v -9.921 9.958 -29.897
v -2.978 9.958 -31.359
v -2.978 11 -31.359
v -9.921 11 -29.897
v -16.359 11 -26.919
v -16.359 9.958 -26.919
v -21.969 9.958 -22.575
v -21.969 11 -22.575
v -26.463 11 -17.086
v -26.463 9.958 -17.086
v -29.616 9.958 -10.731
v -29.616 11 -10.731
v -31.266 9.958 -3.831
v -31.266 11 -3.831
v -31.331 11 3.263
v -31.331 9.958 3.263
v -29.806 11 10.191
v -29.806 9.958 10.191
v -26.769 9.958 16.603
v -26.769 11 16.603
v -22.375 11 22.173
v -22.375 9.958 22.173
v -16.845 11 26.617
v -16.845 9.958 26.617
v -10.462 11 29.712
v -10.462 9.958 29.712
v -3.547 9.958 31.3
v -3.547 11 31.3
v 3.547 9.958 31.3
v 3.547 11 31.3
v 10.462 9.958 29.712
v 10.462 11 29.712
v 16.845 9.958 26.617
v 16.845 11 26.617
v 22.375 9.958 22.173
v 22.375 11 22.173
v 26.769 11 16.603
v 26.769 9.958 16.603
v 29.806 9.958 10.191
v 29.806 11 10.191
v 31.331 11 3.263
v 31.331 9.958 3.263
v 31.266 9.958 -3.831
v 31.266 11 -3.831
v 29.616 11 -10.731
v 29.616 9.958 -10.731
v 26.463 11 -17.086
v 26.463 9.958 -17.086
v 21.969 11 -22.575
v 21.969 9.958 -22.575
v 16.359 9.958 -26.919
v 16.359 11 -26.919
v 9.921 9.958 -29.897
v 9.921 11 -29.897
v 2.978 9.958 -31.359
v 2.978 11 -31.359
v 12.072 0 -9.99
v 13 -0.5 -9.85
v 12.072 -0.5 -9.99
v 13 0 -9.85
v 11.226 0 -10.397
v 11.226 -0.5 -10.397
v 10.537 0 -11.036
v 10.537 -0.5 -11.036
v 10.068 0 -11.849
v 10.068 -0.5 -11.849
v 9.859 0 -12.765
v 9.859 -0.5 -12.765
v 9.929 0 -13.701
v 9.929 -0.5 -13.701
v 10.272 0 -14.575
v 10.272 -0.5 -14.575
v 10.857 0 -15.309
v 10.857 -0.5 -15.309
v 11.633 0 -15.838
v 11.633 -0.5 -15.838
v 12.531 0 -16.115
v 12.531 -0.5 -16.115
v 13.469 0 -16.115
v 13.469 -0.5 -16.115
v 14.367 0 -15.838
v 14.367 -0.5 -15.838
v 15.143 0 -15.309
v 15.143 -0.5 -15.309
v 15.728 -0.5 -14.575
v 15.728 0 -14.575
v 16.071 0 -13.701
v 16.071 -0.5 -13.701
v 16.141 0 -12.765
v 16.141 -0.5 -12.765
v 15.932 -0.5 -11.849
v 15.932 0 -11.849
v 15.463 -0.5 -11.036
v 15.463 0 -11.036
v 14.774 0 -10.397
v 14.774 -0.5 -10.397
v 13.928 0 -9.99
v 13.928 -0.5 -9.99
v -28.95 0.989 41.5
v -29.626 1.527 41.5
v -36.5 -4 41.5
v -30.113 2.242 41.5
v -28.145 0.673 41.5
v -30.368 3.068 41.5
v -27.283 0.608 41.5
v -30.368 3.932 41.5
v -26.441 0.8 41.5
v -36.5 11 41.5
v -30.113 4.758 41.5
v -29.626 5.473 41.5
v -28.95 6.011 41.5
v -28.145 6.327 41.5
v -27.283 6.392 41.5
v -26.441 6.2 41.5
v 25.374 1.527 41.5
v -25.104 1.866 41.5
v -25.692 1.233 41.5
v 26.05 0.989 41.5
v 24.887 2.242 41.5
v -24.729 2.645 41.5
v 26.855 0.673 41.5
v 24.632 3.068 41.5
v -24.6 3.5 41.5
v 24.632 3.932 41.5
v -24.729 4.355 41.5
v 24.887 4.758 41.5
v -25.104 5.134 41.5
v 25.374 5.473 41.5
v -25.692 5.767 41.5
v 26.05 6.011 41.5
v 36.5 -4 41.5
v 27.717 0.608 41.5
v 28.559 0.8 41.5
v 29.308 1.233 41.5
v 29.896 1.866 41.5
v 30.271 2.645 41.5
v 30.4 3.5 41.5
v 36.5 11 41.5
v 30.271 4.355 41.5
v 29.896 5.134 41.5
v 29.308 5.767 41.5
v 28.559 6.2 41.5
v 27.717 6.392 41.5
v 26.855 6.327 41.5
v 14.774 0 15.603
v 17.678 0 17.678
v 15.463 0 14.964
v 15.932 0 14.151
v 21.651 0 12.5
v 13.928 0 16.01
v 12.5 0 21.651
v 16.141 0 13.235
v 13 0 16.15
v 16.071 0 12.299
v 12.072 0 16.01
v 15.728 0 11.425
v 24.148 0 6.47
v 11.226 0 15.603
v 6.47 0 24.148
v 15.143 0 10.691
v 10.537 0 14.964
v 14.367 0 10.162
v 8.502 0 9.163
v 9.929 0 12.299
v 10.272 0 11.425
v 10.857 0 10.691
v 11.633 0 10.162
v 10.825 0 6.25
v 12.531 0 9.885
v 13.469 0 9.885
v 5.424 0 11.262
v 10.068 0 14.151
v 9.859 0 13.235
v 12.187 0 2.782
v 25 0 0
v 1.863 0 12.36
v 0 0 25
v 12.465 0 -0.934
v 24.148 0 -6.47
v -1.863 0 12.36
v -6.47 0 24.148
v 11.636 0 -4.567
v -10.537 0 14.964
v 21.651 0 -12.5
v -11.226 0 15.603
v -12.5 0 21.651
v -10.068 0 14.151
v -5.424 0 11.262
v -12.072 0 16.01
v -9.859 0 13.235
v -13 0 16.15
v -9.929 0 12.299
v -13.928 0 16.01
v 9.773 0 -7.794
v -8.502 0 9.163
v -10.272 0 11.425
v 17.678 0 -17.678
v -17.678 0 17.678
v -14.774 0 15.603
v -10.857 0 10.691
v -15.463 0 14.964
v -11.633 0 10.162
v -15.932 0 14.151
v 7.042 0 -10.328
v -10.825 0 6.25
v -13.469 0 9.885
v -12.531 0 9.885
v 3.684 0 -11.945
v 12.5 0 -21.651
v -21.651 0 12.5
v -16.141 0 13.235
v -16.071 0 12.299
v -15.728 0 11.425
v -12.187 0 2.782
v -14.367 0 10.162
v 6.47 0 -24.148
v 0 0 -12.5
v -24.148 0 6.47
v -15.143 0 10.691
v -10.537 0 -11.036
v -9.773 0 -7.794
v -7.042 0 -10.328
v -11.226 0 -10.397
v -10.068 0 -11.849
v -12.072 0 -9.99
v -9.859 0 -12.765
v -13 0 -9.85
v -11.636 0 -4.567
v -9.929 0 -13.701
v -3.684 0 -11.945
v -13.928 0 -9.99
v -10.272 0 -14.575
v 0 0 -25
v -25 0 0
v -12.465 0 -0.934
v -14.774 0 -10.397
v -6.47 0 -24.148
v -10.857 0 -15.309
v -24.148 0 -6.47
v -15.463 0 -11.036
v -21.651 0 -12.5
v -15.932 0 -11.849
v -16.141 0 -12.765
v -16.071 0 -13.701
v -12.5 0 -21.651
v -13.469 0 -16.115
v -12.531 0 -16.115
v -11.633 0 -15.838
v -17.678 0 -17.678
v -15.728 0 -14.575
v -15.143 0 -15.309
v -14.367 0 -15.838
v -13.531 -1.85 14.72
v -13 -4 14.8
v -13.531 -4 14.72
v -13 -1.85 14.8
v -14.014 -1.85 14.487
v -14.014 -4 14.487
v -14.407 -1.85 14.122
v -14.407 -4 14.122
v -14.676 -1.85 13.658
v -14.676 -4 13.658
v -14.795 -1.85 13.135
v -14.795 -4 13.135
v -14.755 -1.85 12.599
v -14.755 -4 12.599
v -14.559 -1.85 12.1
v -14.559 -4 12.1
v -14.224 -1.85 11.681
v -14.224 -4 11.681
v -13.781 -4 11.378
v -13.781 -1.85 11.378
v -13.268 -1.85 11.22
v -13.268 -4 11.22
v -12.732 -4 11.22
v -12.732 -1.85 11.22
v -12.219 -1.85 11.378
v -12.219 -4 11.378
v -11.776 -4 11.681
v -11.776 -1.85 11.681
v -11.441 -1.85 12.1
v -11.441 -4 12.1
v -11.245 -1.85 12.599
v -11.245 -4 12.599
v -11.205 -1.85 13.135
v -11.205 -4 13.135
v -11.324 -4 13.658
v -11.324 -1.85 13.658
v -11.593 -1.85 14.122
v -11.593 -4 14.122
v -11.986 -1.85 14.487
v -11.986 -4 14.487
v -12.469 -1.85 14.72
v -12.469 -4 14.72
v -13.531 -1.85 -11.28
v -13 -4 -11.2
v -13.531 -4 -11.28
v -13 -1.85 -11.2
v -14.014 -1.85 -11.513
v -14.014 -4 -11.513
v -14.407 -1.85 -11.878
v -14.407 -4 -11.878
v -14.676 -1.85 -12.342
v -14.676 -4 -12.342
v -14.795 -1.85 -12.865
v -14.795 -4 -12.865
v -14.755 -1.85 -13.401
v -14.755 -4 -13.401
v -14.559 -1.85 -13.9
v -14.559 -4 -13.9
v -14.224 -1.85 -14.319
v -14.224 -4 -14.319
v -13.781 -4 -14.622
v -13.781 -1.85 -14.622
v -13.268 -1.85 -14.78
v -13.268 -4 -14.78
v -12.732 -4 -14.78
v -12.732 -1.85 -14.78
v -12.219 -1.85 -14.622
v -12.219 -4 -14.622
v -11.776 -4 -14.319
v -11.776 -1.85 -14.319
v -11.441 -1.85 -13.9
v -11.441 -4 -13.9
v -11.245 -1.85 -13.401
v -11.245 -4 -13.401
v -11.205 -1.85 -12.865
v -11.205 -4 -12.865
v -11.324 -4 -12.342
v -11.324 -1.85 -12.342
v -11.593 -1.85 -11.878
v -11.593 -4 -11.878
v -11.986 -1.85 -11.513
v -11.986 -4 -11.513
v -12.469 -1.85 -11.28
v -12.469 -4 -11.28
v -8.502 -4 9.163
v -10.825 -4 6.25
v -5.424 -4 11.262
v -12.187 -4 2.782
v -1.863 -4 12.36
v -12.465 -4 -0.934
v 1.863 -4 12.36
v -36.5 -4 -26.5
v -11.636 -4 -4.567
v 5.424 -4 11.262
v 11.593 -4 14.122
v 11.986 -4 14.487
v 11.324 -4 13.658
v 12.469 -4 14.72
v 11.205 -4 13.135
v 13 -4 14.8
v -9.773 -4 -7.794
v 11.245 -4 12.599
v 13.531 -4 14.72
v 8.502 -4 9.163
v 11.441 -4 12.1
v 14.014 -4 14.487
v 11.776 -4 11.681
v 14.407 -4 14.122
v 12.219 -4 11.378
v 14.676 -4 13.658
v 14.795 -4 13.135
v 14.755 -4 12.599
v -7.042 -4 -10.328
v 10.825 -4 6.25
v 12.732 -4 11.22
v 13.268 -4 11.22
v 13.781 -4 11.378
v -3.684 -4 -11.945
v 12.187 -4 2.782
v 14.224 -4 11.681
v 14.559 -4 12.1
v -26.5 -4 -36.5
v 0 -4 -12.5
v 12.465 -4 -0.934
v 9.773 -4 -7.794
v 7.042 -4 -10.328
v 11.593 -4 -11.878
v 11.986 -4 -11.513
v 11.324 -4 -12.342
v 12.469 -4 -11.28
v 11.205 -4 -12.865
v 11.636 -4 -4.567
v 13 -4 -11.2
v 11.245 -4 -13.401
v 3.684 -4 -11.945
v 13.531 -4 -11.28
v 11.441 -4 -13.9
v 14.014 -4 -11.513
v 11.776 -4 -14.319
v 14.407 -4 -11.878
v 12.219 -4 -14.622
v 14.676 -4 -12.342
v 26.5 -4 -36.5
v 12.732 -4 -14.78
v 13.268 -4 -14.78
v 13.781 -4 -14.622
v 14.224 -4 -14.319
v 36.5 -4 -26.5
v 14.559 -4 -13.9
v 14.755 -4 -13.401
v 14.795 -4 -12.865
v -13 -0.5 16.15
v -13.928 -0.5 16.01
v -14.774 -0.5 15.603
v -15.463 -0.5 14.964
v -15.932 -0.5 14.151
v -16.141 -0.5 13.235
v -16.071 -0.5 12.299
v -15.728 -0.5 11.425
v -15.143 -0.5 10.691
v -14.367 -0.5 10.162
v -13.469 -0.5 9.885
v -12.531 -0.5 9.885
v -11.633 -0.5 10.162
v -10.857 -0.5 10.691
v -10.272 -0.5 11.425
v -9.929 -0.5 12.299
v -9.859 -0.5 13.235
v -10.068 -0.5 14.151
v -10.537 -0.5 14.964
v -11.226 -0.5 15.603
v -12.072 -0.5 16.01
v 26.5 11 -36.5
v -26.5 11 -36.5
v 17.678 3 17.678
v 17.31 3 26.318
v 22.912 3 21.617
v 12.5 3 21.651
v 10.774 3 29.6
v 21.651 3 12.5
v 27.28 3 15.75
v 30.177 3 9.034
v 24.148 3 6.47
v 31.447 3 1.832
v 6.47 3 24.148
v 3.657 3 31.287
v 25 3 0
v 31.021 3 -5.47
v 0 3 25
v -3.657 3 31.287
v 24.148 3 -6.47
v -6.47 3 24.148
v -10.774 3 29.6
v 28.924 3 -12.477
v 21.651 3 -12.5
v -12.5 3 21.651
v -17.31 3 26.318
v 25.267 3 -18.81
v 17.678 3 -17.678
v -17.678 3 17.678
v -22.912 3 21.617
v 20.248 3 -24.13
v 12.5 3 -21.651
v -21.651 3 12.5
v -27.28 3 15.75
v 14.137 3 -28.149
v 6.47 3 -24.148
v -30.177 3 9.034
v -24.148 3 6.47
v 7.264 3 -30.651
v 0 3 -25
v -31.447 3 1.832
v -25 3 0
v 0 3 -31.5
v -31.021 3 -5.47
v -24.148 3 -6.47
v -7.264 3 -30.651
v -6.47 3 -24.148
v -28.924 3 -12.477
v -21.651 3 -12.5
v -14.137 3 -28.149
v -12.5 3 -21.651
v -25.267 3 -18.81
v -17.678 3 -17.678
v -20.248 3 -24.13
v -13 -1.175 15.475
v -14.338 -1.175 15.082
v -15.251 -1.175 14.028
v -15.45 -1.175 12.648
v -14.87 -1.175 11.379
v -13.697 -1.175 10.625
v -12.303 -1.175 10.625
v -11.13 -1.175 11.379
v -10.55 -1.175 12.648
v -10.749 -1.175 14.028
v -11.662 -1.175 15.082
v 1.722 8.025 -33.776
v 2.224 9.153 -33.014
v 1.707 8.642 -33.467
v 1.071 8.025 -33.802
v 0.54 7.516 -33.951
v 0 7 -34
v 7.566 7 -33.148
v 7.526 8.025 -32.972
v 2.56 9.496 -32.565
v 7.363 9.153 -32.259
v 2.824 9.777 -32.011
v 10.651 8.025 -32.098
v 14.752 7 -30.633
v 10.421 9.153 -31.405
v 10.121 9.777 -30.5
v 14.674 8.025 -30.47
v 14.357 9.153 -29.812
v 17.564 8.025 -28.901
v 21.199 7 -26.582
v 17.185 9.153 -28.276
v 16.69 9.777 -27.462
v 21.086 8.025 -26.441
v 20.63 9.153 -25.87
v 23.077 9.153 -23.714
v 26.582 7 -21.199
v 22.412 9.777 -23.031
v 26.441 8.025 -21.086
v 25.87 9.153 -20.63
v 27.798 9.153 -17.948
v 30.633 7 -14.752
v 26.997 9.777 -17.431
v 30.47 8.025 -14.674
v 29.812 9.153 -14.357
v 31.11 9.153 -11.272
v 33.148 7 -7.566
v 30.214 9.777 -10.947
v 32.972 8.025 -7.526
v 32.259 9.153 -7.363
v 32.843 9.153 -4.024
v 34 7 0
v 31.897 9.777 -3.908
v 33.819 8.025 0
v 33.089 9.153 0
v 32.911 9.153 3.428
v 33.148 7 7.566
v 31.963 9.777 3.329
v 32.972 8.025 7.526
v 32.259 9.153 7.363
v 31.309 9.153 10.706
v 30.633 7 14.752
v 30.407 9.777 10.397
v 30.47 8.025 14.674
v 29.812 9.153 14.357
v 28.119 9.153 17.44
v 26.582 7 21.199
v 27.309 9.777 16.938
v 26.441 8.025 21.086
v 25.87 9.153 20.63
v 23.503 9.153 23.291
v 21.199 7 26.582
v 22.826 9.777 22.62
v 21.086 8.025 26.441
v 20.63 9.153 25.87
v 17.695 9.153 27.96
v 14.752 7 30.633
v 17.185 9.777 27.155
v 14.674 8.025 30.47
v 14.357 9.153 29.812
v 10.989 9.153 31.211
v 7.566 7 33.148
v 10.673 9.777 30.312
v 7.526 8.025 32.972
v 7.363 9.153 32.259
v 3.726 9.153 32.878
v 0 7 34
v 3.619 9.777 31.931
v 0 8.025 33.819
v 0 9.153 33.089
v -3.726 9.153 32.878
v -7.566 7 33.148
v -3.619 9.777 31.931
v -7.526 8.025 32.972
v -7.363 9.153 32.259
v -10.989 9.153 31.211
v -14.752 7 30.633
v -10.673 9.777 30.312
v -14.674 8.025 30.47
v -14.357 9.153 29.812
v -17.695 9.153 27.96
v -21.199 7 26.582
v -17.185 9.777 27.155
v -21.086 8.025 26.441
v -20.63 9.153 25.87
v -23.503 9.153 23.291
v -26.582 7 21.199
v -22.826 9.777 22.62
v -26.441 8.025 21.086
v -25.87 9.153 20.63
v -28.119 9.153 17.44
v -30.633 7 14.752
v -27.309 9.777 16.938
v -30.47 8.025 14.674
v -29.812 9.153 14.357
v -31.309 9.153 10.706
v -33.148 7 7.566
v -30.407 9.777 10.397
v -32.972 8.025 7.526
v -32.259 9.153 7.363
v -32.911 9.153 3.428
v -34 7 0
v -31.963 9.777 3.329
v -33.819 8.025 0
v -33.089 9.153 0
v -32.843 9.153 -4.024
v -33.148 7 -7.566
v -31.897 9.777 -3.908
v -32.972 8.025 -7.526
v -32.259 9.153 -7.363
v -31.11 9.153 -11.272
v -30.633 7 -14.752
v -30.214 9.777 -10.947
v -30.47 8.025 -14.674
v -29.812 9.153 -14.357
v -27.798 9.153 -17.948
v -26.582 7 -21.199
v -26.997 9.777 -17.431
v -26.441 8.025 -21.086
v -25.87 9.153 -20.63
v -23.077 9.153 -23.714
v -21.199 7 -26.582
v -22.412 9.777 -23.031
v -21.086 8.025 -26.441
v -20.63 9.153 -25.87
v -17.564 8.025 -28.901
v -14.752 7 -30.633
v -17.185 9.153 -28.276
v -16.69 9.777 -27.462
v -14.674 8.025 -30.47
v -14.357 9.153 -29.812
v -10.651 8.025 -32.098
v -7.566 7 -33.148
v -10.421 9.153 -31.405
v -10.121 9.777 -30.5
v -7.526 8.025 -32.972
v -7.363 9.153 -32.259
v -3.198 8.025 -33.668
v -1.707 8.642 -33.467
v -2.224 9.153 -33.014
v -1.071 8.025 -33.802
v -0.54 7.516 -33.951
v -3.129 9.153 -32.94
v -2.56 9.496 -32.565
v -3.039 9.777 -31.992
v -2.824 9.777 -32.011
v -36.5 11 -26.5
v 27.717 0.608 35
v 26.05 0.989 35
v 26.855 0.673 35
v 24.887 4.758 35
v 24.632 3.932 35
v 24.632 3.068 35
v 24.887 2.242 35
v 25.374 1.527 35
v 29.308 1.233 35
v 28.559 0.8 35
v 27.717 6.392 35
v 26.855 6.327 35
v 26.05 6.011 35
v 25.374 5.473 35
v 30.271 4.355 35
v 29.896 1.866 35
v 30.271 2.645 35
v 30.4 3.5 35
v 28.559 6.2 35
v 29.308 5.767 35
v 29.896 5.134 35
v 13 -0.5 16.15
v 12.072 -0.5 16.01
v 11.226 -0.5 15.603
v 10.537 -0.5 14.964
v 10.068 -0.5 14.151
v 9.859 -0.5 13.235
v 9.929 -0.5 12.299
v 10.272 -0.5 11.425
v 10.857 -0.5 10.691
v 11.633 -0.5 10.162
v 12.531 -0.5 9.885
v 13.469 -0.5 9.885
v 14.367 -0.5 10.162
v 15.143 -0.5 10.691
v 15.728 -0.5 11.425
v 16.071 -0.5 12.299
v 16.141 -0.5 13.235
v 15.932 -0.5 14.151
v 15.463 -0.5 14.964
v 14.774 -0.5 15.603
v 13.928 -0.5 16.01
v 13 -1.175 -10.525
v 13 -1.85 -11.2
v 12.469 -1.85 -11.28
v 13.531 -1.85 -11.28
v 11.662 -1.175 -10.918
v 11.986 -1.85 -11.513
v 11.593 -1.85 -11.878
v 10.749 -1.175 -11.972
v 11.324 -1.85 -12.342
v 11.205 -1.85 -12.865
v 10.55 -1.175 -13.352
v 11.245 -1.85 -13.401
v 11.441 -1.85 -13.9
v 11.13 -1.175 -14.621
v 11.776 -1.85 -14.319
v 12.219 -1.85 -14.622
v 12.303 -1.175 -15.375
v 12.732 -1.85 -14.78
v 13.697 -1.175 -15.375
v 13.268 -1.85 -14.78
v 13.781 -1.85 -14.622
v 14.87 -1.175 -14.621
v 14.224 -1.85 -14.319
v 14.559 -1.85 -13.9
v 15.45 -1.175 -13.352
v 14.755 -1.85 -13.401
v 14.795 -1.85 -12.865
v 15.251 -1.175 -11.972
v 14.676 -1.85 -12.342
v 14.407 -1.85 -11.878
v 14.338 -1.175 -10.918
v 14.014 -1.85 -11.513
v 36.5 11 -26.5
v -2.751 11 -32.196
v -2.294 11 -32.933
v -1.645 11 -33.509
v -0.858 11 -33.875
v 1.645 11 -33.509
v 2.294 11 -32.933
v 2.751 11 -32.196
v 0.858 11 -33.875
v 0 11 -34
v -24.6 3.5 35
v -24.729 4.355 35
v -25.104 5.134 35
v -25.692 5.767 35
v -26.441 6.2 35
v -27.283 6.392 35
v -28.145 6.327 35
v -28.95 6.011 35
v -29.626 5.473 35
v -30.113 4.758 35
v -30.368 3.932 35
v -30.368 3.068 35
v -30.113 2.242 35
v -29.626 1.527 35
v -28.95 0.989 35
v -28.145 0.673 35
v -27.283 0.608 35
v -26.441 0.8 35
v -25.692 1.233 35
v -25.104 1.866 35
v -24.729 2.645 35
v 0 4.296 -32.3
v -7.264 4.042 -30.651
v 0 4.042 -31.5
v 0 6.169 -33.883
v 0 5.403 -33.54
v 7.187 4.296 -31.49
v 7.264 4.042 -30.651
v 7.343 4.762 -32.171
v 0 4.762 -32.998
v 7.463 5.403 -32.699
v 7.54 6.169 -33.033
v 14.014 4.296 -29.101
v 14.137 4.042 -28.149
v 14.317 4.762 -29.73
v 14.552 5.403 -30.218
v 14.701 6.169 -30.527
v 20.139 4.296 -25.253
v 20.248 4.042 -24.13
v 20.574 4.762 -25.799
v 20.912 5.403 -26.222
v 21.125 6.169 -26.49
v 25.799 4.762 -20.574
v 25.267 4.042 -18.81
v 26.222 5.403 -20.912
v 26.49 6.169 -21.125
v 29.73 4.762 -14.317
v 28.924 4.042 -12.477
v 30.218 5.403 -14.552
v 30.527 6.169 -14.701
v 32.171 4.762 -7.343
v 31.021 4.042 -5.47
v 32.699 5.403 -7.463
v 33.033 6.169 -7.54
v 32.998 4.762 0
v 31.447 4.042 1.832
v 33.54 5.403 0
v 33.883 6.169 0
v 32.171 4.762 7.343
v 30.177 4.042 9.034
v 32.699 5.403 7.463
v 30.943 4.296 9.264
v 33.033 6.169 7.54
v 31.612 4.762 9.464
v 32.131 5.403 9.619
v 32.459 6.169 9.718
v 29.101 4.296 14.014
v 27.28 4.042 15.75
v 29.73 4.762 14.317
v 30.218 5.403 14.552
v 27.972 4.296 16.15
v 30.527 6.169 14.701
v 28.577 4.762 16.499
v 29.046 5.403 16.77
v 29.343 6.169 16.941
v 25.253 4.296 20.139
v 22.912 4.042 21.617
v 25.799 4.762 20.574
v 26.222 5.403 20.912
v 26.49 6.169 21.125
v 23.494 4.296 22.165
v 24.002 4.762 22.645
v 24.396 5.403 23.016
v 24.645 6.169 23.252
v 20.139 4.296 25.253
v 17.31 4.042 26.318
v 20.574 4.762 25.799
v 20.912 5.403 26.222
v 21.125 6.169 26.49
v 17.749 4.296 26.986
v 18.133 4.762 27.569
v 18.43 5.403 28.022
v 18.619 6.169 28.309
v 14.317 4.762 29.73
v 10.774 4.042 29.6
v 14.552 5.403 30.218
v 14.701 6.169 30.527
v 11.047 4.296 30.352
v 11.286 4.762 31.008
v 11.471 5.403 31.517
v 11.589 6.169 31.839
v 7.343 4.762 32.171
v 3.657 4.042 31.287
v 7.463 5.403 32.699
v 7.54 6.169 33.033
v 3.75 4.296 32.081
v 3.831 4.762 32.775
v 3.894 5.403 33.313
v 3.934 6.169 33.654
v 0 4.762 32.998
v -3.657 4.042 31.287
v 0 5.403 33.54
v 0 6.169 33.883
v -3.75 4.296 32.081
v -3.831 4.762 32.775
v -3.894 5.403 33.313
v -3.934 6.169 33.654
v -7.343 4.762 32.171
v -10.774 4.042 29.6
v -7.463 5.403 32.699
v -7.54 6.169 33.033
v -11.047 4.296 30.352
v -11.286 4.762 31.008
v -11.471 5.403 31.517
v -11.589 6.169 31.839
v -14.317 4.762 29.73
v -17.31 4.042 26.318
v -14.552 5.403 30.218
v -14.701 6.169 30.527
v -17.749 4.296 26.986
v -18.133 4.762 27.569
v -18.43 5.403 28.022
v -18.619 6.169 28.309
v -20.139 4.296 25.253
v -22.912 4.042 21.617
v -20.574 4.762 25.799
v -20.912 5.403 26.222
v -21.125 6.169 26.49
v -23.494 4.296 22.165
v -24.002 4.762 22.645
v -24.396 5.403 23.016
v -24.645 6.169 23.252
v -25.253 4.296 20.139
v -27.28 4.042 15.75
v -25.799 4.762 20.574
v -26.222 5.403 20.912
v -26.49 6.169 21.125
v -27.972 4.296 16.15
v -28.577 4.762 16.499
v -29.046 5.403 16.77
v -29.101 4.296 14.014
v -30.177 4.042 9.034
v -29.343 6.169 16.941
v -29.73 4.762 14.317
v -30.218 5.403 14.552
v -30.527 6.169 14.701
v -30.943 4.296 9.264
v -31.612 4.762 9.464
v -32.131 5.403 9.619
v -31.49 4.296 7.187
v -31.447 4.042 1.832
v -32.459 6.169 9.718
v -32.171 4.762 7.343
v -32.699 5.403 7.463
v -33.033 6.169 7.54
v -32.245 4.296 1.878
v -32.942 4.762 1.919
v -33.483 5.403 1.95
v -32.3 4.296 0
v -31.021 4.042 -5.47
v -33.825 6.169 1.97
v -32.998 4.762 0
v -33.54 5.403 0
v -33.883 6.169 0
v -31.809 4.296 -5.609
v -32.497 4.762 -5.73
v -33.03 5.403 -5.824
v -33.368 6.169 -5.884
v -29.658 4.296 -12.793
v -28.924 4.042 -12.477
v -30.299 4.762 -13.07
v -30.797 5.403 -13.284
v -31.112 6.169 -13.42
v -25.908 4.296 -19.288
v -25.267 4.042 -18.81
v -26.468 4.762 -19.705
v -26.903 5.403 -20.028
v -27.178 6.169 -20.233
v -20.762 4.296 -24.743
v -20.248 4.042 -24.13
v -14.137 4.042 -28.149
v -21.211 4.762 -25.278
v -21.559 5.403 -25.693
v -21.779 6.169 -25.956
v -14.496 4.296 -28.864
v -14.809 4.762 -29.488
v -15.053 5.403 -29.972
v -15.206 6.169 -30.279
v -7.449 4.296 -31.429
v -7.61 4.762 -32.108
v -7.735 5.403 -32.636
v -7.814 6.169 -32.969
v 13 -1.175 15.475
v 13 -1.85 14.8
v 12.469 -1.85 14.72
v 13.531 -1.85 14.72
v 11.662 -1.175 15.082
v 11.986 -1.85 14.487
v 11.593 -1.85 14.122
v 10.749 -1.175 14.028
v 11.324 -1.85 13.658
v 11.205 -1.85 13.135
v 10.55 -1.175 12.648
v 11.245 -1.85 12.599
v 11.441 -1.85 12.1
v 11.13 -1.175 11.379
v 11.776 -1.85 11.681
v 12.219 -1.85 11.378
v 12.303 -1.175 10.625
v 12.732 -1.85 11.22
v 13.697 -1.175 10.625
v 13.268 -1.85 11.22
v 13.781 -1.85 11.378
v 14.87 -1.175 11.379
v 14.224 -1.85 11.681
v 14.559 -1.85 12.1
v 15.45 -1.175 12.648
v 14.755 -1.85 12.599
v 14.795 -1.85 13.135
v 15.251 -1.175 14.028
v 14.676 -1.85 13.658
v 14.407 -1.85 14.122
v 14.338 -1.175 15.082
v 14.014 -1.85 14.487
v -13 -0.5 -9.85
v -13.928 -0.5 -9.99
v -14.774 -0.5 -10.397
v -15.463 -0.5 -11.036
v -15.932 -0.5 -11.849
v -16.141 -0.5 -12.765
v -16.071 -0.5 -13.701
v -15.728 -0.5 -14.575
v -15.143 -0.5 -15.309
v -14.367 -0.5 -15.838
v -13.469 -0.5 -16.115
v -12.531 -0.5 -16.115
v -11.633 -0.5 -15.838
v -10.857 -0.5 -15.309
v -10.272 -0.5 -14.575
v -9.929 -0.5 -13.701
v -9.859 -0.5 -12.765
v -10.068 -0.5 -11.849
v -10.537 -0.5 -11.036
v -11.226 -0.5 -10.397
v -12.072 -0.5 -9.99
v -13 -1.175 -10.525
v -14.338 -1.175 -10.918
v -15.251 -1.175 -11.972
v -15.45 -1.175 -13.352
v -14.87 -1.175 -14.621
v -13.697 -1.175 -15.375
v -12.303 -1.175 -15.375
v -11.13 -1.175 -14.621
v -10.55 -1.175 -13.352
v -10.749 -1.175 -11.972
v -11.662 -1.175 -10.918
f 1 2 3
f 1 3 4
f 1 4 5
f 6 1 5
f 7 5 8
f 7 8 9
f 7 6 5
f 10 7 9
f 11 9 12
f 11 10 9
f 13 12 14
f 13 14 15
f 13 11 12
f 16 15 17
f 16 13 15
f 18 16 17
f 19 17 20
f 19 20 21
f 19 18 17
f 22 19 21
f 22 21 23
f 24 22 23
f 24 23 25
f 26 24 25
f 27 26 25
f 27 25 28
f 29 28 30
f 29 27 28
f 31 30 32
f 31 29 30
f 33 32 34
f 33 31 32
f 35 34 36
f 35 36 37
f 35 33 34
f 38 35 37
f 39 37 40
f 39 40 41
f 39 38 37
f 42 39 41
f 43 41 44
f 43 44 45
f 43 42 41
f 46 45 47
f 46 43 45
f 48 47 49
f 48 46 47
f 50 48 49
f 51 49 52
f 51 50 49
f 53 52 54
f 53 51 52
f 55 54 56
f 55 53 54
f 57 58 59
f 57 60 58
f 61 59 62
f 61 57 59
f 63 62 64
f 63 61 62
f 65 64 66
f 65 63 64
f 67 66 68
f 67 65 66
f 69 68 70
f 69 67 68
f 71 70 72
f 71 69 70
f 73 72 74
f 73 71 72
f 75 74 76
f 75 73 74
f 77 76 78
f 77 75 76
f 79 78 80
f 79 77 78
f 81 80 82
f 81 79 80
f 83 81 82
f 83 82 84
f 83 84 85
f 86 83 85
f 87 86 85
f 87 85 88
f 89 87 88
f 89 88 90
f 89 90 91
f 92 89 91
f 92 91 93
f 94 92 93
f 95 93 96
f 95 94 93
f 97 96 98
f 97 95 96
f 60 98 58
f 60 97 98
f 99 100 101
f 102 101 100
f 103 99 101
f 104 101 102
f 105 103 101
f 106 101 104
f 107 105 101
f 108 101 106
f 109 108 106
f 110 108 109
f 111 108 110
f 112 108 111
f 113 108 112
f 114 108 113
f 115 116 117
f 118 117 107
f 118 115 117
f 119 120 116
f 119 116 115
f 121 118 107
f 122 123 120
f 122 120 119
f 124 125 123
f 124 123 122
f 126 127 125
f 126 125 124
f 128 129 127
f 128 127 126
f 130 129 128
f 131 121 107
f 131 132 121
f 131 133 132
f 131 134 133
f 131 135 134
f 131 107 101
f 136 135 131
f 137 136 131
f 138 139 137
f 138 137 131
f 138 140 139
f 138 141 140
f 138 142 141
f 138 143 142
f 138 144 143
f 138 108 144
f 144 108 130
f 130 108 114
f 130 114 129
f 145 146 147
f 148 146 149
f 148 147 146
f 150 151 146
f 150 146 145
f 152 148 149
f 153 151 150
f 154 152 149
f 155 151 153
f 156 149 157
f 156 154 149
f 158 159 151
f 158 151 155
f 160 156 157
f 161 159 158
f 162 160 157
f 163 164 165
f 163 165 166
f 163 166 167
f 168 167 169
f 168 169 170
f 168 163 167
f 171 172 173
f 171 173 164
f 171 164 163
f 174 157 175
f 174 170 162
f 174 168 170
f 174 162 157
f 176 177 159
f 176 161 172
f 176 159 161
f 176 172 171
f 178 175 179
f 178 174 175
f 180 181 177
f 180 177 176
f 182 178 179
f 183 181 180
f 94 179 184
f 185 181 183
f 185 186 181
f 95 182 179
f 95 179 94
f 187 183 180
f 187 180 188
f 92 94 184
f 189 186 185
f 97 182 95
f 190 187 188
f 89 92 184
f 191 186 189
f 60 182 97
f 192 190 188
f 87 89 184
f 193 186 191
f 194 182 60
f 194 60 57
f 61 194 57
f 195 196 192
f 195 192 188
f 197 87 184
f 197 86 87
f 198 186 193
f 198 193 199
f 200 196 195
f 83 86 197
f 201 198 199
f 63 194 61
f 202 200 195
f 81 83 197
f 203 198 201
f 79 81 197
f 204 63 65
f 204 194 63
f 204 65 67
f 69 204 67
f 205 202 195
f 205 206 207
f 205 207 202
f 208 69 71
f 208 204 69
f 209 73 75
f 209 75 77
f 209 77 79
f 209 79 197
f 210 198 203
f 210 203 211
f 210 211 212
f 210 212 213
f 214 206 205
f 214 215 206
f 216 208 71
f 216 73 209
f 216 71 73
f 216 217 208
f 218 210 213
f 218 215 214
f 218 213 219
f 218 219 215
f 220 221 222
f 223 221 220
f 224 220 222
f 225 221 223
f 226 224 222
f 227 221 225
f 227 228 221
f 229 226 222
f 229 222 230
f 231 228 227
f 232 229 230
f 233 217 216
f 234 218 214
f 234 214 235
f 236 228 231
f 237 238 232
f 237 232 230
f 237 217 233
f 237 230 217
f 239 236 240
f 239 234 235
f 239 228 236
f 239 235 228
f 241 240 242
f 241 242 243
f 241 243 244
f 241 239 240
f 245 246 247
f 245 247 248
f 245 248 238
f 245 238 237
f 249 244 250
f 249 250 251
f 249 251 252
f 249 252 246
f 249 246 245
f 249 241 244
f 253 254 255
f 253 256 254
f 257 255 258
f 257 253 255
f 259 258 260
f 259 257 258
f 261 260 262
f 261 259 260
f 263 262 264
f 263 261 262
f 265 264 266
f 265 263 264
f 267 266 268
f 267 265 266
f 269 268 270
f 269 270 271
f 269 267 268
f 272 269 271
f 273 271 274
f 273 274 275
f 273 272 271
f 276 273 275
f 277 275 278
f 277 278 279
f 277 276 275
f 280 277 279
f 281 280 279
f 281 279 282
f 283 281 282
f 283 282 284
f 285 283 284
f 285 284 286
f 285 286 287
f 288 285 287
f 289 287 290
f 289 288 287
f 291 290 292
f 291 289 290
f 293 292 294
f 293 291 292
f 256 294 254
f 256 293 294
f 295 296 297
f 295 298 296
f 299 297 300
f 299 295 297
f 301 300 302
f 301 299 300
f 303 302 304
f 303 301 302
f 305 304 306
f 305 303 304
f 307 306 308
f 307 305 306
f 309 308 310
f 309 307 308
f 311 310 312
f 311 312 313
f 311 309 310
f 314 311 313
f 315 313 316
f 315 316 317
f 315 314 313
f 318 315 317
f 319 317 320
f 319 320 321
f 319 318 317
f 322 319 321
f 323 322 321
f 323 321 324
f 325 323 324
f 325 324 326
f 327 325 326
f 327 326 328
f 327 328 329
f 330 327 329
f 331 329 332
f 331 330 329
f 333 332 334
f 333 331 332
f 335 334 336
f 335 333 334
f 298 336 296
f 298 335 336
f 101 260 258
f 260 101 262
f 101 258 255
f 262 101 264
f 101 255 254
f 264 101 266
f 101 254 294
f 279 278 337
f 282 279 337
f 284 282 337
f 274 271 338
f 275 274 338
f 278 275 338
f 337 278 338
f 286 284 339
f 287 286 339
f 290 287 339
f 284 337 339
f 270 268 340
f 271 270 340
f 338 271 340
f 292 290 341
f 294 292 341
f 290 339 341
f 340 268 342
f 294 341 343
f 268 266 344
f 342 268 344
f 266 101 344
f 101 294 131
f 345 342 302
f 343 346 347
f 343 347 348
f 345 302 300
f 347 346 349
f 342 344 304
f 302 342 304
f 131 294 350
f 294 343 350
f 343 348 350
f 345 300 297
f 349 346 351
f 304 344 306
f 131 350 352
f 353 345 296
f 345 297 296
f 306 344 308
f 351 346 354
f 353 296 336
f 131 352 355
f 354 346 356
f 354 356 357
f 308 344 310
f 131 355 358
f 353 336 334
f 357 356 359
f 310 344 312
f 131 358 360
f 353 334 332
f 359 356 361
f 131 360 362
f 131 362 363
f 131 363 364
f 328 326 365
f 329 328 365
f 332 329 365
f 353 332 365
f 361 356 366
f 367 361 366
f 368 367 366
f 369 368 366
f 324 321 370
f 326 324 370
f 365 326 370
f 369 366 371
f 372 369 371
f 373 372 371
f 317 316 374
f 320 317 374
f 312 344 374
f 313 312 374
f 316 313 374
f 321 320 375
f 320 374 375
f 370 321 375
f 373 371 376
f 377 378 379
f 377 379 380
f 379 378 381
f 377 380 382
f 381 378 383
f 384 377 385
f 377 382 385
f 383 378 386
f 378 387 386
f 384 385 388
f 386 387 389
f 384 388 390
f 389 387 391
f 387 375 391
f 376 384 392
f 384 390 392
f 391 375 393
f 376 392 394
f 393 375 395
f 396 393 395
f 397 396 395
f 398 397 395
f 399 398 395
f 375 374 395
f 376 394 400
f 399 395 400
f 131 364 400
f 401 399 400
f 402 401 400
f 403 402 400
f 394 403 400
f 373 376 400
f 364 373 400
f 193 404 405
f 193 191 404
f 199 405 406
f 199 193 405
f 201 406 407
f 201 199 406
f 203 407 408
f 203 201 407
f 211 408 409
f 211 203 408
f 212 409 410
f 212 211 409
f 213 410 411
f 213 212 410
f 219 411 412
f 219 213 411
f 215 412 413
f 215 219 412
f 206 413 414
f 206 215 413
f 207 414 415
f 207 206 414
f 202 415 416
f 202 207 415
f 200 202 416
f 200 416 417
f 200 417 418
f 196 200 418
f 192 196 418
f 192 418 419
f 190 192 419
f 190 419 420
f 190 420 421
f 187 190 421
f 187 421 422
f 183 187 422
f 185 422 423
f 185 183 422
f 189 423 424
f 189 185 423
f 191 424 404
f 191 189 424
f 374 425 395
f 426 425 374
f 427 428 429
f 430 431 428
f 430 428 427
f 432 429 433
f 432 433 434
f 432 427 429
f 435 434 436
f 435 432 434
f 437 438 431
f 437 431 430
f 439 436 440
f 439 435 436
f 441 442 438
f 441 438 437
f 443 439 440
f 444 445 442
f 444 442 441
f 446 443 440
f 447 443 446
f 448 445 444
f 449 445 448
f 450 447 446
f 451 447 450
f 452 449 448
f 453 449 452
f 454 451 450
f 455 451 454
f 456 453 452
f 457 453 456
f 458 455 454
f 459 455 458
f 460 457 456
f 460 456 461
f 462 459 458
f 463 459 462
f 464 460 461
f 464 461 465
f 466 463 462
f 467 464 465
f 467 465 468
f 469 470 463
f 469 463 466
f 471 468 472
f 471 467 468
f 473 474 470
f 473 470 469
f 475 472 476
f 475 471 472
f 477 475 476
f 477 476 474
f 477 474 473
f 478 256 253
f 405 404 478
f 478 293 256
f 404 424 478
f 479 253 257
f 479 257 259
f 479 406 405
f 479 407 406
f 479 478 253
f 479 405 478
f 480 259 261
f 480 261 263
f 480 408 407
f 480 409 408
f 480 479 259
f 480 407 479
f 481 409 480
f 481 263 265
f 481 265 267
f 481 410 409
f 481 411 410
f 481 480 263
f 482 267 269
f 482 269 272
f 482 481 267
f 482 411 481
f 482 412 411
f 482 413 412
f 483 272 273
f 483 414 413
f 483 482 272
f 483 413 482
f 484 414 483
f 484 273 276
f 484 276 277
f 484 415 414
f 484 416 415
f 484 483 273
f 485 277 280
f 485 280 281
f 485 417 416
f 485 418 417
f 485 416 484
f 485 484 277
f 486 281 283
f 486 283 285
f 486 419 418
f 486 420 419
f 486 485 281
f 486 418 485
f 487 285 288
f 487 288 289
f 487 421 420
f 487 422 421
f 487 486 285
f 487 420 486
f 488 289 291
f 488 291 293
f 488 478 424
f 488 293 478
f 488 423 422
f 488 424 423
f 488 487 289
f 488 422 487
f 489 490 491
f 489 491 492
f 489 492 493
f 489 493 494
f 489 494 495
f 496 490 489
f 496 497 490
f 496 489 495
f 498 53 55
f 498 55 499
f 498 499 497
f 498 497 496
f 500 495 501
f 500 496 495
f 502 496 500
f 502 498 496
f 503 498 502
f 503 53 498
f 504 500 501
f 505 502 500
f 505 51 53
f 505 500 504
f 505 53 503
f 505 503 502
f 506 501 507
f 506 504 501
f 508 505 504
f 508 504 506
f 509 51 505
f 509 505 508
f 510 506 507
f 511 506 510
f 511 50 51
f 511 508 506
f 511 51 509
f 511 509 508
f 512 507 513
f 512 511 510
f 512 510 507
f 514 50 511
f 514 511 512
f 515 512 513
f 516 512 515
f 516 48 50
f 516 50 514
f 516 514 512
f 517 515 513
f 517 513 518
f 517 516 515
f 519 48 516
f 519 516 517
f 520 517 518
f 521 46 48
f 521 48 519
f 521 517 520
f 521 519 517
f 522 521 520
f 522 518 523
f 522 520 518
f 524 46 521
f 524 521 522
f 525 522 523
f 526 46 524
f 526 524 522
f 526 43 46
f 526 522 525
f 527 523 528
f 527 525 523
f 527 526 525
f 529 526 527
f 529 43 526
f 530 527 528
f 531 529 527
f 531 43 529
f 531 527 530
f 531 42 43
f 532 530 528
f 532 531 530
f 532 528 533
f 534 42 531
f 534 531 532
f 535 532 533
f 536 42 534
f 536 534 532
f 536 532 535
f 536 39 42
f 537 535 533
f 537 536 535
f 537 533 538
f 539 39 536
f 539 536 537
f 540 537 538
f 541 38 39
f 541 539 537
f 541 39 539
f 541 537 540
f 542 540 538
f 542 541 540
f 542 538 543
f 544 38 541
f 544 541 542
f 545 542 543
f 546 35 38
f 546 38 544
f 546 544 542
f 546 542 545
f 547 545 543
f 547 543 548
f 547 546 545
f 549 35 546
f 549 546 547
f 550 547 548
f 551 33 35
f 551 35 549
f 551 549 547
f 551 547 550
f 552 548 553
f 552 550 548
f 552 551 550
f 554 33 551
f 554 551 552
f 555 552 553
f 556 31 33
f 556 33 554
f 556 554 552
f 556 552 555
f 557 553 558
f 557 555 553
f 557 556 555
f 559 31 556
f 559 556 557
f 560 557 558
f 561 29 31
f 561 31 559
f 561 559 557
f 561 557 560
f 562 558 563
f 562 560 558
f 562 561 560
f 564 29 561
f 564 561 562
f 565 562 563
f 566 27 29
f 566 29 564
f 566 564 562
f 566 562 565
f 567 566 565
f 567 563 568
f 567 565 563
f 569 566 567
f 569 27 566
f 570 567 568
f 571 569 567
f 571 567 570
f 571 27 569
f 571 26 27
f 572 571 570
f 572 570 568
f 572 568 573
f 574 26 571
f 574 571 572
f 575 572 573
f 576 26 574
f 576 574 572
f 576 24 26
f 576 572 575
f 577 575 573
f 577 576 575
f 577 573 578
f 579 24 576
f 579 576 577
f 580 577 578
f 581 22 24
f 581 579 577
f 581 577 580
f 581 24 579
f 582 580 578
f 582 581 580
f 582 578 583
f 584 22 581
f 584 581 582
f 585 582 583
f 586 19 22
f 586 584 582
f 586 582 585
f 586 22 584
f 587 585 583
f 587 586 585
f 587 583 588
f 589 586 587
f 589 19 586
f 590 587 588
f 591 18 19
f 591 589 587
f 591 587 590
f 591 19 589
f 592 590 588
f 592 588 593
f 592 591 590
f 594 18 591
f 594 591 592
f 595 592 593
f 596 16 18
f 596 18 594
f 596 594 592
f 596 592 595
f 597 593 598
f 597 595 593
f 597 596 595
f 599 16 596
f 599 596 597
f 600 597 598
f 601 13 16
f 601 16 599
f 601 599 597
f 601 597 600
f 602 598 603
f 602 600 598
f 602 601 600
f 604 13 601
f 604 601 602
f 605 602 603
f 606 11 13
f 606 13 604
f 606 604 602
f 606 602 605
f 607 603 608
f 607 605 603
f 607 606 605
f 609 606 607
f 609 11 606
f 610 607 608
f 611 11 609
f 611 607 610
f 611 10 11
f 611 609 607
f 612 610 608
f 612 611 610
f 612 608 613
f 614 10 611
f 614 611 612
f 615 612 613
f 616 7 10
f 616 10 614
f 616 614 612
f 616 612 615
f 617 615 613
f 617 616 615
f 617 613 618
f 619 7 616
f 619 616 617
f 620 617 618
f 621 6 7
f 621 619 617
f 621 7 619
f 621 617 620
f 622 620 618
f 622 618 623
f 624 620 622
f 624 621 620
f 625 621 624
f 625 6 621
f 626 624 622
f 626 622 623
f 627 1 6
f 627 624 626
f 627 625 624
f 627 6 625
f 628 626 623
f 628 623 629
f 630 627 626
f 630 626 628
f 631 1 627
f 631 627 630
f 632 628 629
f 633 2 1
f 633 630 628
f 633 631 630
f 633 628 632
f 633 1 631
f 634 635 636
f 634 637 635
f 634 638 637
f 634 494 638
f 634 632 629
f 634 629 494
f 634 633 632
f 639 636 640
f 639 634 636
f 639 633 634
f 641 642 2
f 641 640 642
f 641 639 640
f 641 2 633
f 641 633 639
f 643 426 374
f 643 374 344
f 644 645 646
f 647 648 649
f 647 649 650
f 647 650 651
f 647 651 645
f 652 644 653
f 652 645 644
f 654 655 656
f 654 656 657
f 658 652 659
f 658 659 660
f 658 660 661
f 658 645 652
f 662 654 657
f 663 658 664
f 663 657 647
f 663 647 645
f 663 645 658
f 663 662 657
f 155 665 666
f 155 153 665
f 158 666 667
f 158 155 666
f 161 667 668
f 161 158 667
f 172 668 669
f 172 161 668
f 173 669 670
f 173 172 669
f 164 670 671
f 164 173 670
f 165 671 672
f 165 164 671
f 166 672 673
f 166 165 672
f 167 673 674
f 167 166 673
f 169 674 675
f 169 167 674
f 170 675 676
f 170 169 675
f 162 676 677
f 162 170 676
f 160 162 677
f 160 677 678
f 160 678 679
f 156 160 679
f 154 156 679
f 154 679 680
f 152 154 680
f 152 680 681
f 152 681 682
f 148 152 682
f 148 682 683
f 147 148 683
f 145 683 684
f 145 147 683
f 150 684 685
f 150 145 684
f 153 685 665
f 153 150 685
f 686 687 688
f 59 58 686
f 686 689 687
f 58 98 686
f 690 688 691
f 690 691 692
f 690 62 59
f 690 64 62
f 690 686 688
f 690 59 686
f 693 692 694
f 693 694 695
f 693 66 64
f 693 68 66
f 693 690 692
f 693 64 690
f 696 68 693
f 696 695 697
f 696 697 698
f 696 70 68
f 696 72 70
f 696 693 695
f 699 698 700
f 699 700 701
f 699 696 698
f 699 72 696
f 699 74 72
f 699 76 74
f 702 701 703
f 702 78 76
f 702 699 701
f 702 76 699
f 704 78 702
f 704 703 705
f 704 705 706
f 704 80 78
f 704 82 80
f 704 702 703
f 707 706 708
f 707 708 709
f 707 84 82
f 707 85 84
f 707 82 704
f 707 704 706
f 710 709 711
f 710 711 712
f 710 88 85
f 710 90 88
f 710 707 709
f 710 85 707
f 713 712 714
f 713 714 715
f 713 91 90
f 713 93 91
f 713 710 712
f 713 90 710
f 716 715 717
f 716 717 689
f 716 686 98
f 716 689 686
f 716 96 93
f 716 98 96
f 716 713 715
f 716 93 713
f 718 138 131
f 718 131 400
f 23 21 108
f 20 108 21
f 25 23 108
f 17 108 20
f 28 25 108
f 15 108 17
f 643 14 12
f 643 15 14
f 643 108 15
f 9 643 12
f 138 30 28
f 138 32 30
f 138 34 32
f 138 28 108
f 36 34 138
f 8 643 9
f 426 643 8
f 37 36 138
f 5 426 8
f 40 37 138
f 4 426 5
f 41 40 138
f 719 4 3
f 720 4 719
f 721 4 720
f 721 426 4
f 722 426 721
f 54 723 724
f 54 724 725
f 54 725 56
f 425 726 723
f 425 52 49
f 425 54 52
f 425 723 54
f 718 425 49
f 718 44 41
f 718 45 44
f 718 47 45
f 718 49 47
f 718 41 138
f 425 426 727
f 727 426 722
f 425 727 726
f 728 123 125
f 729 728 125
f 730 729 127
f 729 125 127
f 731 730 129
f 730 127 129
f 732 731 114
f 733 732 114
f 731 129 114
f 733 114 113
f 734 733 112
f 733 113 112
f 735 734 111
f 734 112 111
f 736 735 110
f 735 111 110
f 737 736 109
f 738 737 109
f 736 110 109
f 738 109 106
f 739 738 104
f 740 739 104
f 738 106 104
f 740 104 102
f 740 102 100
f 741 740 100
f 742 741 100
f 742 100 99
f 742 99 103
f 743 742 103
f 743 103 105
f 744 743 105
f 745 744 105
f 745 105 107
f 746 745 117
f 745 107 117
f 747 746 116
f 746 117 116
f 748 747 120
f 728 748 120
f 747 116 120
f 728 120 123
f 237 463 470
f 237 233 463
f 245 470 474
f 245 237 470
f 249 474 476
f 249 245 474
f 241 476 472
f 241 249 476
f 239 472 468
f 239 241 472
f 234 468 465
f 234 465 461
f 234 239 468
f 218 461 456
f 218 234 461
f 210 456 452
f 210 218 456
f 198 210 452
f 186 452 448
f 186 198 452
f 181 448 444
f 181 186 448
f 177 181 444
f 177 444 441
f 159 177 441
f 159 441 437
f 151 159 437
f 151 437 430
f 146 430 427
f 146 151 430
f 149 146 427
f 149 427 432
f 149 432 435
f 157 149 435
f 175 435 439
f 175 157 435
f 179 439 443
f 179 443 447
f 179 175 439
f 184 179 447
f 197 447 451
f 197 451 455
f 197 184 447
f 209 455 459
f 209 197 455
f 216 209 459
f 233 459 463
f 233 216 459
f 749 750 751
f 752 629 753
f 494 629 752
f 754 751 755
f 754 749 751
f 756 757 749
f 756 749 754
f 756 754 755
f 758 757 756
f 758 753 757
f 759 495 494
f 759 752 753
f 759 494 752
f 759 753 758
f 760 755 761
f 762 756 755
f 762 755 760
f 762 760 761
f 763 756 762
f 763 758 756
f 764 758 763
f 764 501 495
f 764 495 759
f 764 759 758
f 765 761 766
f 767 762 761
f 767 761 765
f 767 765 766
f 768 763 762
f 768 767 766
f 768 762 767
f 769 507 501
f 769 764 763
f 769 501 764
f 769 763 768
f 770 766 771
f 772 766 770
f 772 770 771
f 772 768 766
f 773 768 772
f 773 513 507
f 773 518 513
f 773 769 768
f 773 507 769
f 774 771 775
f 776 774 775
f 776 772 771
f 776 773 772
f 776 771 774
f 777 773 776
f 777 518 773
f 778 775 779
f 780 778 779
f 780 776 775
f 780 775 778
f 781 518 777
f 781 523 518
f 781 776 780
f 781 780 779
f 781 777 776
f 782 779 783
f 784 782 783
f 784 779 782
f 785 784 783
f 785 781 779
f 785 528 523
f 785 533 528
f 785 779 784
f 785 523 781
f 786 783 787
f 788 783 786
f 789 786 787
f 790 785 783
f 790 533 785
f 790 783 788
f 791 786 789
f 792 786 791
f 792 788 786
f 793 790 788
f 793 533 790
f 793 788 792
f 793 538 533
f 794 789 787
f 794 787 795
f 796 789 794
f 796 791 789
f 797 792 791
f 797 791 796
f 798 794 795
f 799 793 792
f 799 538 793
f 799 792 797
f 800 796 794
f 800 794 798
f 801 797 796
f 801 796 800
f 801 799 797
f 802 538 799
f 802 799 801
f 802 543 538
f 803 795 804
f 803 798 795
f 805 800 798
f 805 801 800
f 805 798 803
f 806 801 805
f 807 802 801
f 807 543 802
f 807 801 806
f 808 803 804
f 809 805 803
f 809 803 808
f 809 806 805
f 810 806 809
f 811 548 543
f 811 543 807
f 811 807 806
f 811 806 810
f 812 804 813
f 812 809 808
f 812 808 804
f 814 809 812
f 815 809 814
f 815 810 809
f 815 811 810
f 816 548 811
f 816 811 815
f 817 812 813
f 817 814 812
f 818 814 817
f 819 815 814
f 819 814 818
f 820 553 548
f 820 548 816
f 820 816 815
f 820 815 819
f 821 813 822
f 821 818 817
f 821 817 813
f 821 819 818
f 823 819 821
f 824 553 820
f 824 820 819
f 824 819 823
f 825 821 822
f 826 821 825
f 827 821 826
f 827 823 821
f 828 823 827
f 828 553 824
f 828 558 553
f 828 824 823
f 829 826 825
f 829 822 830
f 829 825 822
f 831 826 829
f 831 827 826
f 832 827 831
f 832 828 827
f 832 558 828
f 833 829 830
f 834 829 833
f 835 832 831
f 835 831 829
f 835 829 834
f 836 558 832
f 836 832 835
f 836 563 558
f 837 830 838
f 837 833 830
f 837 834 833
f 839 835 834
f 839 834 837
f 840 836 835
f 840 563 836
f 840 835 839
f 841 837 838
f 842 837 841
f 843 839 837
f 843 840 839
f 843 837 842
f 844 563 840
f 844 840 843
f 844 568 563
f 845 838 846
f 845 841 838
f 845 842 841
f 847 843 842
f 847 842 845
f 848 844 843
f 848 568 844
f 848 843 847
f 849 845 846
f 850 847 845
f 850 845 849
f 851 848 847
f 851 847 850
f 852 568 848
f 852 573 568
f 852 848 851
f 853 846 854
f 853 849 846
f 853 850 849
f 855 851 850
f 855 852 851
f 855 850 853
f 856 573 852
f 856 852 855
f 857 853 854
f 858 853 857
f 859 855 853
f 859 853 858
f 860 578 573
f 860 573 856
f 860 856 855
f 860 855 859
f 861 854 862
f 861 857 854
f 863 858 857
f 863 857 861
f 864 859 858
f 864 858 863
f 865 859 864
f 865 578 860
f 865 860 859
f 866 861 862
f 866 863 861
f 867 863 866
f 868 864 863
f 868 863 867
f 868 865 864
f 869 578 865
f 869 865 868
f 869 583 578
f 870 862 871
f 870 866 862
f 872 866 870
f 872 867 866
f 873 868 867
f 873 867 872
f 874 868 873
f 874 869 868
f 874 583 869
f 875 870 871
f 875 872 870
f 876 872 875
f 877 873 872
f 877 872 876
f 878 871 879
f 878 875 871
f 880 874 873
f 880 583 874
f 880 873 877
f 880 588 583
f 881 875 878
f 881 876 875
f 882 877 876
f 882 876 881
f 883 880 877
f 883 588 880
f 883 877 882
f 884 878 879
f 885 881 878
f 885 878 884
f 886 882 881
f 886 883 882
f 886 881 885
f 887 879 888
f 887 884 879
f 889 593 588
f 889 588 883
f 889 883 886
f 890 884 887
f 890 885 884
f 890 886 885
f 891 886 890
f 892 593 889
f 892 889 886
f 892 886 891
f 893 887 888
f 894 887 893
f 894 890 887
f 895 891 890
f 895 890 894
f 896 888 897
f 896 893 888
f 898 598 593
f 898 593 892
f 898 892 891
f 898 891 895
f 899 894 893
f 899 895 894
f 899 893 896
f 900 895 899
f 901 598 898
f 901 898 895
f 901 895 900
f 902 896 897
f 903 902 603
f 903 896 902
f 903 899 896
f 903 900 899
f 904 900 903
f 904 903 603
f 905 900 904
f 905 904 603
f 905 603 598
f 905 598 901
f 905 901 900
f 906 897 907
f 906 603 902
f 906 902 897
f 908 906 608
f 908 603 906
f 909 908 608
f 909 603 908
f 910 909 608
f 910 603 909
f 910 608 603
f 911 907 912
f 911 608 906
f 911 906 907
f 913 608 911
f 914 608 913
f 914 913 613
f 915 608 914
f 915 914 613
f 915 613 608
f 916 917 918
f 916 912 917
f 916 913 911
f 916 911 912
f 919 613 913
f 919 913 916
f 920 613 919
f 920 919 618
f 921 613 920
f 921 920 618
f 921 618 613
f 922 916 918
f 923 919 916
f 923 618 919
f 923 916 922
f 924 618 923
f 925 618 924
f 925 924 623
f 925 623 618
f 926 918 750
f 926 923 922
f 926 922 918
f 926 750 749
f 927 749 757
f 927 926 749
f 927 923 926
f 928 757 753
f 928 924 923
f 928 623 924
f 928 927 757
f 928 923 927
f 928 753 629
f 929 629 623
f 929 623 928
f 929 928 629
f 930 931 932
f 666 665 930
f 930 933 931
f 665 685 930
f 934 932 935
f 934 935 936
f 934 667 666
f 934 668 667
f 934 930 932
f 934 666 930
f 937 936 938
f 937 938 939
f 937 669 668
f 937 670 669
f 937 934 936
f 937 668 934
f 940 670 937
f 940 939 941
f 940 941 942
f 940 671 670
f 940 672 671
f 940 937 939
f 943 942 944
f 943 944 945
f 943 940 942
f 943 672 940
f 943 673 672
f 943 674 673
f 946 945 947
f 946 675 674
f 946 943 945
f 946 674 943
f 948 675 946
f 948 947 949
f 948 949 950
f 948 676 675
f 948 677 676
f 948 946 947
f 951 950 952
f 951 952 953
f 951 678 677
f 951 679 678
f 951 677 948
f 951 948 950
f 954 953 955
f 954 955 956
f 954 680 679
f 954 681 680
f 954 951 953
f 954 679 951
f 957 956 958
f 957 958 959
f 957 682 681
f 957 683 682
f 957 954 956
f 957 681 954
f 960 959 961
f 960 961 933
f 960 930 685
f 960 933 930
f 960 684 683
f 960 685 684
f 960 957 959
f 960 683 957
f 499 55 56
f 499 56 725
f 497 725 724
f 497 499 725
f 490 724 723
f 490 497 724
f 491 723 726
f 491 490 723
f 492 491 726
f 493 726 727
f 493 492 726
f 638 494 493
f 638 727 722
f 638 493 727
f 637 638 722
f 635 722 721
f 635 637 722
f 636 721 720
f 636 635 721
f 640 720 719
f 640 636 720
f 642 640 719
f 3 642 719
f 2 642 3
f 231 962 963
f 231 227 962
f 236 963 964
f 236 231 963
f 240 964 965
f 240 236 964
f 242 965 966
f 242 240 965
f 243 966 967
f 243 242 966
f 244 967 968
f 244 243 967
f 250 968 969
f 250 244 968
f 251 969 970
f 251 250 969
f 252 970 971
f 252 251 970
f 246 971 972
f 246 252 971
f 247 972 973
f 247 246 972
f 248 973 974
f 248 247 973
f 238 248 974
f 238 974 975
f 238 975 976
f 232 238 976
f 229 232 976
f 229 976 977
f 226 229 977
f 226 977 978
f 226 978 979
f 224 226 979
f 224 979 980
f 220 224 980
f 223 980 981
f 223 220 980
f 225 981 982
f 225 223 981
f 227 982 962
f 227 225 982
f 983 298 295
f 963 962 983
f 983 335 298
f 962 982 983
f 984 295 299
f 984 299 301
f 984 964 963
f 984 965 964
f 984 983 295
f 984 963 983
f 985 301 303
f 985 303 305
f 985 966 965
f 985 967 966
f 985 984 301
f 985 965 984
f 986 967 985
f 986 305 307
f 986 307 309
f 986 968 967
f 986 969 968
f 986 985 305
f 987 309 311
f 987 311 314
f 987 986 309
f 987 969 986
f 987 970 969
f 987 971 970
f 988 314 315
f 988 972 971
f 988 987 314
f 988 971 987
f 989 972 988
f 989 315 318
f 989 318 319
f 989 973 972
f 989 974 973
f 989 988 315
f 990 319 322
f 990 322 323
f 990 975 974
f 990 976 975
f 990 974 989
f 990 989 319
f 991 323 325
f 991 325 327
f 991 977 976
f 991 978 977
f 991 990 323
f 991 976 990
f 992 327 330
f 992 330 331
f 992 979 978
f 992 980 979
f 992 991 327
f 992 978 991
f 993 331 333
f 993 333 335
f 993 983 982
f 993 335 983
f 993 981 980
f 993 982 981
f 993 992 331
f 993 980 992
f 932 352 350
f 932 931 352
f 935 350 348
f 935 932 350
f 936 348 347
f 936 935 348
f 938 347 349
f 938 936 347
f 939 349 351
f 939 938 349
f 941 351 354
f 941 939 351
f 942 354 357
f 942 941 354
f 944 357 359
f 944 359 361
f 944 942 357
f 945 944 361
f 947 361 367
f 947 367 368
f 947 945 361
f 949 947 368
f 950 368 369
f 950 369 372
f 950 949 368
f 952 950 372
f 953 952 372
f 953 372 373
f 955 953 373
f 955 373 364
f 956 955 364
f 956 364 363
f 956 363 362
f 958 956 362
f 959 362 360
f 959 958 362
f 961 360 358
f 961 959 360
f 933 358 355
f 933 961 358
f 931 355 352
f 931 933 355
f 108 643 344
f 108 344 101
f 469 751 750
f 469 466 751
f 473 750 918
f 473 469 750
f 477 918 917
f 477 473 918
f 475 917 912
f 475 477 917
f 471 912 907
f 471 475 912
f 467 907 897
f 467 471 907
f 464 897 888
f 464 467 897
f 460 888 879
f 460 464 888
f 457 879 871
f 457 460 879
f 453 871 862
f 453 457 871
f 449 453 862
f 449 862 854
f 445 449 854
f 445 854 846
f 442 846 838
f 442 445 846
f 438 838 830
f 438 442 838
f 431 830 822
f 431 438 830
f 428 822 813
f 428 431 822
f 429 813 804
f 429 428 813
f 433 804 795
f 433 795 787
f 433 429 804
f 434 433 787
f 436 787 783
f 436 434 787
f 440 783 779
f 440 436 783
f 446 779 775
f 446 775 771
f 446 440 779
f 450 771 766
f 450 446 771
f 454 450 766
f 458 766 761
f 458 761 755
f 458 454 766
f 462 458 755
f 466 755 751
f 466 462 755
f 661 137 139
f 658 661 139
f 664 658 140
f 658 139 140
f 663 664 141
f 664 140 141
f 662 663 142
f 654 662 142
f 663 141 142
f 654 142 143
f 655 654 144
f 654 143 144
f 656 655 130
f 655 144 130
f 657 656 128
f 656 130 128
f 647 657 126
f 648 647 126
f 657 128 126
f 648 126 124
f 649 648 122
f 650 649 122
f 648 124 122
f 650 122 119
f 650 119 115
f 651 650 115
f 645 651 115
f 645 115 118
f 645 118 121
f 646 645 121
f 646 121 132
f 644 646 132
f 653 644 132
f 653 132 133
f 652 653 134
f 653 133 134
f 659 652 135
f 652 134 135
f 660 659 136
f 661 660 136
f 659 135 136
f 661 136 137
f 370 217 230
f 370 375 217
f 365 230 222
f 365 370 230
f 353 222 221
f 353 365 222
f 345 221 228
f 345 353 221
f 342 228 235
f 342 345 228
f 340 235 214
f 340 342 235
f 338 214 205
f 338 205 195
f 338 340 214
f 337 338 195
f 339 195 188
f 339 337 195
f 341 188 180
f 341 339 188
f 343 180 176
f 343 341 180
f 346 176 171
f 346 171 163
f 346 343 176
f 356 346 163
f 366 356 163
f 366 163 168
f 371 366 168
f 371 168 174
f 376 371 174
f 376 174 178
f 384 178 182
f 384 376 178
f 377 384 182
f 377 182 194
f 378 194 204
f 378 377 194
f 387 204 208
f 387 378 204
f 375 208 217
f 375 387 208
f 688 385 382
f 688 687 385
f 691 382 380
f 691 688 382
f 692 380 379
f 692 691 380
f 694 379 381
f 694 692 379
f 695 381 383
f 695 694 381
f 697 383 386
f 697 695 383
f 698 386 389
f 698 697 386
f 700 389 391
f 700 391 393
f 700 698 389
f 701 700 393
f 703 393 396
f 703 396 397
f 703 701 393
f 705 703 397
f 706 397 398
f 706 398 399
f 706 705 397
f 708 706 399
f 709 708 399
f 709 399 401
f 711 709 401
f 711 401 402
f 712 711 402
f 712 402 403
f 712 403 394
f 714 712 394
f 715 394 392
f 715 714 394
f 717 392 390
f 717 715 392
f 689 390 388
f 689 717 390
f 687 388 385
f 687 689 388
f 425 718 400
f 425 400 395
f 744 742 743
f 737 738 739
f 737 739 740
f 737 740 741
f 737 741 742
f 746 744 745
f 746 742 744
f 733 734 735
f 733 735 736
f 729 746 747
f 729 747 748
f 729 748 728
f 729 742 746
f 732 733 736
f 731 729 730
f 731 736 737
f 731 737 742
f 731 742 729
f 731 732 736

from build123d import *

# Parameters (mm, degrees)
SKETCH3_R                                    = 1.25
CUT_EXTRUDE1_DEPTH                           = 53.777836257
SKETCH5_R                                    = 3
SKETCH6_R                                    = 3
CUT_EXTRUDE2_DEPTH                           = 10
BOSS_EXTRUDE1_DEPTH                          = 15
SKETCH9_R                                    = 2.9
CUT_EXTRUDE3_DEPTH                           = 6.5
CSK_FOR_M3_COUNTERSUNK_FLAT_HEAD_SCR_2_COUNT = 2
CSK_FOR_M3_COUNTERSUNK_FLAT_HEAD_SCR_2_PITCH = 26
CSK_FOR_M3_COUNTERSUNK_FLAT_HEAD_SCR_3_COUNT = 2
CSK_FOR_M3_COUNTERSUNK_FLAT_HEAD_SCR_3_PITCH = 36.769552622
CSK_FOR_M3_COUNTERSUNK_FLAT_HEAD_SCR_4_COUNT = 2
CSK_FOR_M3_COUNTERSUNK_FLAT_HEAD_SCR_4_PITCH = 26
BOSS_EXTRUDE2_DEPTH                          = 15


with BuildPart() as part:
    # Sketch2 → Revolve1 (revolve)
    with BuildSketch(Plane.XY, mode=Mode.PRIVATE) as revolve1_sk:
        Polygon((-25, 3), (-25, 0), (-12.5, 0), (-12.5, -4), (-36.5, -4), (-36.5, 11), (-31.5, 11), (-31.5, 3), align=None)
    revolve(revolve1_sk.sketch.rotate(Axis((0, 0, 0), (0, 1, 0)), 270), axis=Axis((0, 0, 0), (0, 1, 0)))

    # Sketch3 → Cut-Extrude1 (cut, through all)
    with BuildSketch(Plane(origin=(0, 0, 0), x_dir=(1, 0, 0), z_dir=(0, 1, 0))):
        with Locations(Location((-13, 13, 0), (0, 0, 270))):
            Circle(SKETCH3_R)
        with Locations(Location((13, 13, 0), (0, 0, 270))):
            Circle(SKETCH3_R)
        with Locations(Location((13, -13, 0), (0, 0, 270))):
            Circle(SKETCH3_R)
        with Locations(Location((-13, -13, 0), (0, 0, 270))):
            Circle(SKETCH3_R)
    extrude(amount=-CUT_EXTRUDE1_DEPTH, mode=Mode.SUBTRACT)

    # Sketch5 → Cut-Revolve1 (revolve, cut)
    with BuildSketch(Plane.XY, mode=Mode.PRIVATE) as cut_revolve1_sk:
        with Locations((31, 7)):
            Circle(SKETCH5_R)
    revolve(cut_revolve1_sk.sketch.rotate(Axis((0, 0, 0), (0, -1, 0)), 270), axis=Axis((0, 0, 0), (0, -1, 0)), mode=Mode.SUBTRACT)

    # Sketch6 → Cut-Extrude2 (cut)
    with BuildSketch(Plane(origin=(0, 7, 0), x_dir=(1, 0, 0), z_dir=(0, 1, 0))):
        with Locations((0, 31)):
            Circle(SKETCH6_R)
    extrude(amount=CUT_EXTRUDE2_DEPTH, mode=Mode.SUBTRACT)

    # Sketch7 → Boss-Extrude1 (add)
    with BuildSketch(Plane(origin=(0, 11, 0), x_dir=(1, 0, 0), z_dir=(0, 1, 0))):
        with BuildLine():
            Line((-36.5, 0), (-36.5, -41.5))
            Line((-36.5, -41.5), (36.5, -41.5))
            Line((36.5, -41.5), (36.5, 0))
            ThreePointArc((36.5, 0), (0, -36.5), (-36.5, 0))
        make_face()
    extrude(amount=-BOSS_EXTRUDE1_DEPTH)

    # Sketch9 → Cut-Extrude3 (cut)
    with BuildSketch(Plane.XY.offset(41.5)):
        with Locations((-27.5, 3.5)):
            Circle(SKETCH9_R)
        with Locations((27.5, 3.5)):
            Circle(SKETCH9_R)
    extrude(amount=-CUT_EXTRUDE3_DEPTH, mode=Mode.SUBTRACT)

    # Sketch11 → CSK for M3 Countersunk Flat Head Screw1 (revolve, cut)
    with BuildSketch(Plane(origin=(13, 0, -13), x_dir=(0, 0, 1), z_dir=(1, 0, 0))):
        Polygon((0, 0), (0, 4), (1.8, 4), (1.8, 1.85), (3.15, 0.5), (3.15, 0), align=None)
    csk_for_m3_countersunk_flat_head_screw1 = revolve(axis=Axis((13, 6.35, -13), (0, -1, 0)), mode=Mode.SUBTRACT)

    # CSK for M3 Countersunk Flat Head Scr 2: CSK for M3 Countersunk Flat Head Screw1 ×2
    with Locations(*[(0, 0, i * CSK_FOR_M3_COUNTERSUNK_FLAT_HEAD_SCR_2_PITCH) for i in range(1, CSK_FOR_M3_COUNTERSUNK_FLAT_HEAD_SCR_2_COUNT)]):
        add(csk_for_m3_countersunk_flat_head_screw1, mode=Mode.SUBTRACT)

    # CSK for M3 Countersunk Flat Head Scr 3: CSK for M3 Countersunk Flat Head Screw1 ×2
    with Locations(*[Vector(-0.7071067811865476, 0, 0.7071067811865476) * (i * CSK_FOR_M3_COUNTERSUNK_FLAT_HEAD_SCR_3_PITCH) for i in range(1, CSK_FOR_M3_COUNTERSUNK_FLAT_HEAD_SCR_3_COUNT)]):
        add(csk_for_m3_countersunk_flat_head_screw1, mode=Mode.SUBTRACT)

    # CSK for M3 Countersunk Flat Head Scr 4: CSK for M3 Countersunk Flat Head Screw1 ×2
    with Locations(*[(-i * CSK_FOR_M3_COUNTERSUNK_FLAT_HEAD_SCR_4_PITCH, 0, 0) for i in range(1, CSK_FOR_M3_COUNTERSUNK_FLAT_HEAD_SCR_4_COUNT)]):
        add(csk_for_m3_countersunk_flat_head_screw1, mode=Mode.SUBTRACT)

    # Sketch12 → Boss-Extrude2 (add)
    with BuildSketch(Plane(origin=(0, 11, 0), x_dir=(1, 0, 0), z_dir=(0, 1, 0))):
        with BuildLine():
            Line((26.5, 36.5), (0, 36.5))
            ThreePointArc((0, 36.5), (25.809397513, 25.809397513), (36.5, 0))
            Line((36.5, 0), (36.5, 26.5))
            Line((36.5, 26.5), (26.5, 36.5))
        make_face()
        with BuildLine():
            Line((-36.5, 26.5), (-36.5, 0))
            ThreePointArc((-36.5, 0), (-25.809397513, 25.809397513), (0, 36.5))
            Line((0, 36.5), (-26.5, 36.5))
            Line((-26.5, 36.5), (-36.5, 26.5))
        make_face()
    extrude(amount=-BOSS_EXTRUDE2_DEPTH)


solid = part.part
